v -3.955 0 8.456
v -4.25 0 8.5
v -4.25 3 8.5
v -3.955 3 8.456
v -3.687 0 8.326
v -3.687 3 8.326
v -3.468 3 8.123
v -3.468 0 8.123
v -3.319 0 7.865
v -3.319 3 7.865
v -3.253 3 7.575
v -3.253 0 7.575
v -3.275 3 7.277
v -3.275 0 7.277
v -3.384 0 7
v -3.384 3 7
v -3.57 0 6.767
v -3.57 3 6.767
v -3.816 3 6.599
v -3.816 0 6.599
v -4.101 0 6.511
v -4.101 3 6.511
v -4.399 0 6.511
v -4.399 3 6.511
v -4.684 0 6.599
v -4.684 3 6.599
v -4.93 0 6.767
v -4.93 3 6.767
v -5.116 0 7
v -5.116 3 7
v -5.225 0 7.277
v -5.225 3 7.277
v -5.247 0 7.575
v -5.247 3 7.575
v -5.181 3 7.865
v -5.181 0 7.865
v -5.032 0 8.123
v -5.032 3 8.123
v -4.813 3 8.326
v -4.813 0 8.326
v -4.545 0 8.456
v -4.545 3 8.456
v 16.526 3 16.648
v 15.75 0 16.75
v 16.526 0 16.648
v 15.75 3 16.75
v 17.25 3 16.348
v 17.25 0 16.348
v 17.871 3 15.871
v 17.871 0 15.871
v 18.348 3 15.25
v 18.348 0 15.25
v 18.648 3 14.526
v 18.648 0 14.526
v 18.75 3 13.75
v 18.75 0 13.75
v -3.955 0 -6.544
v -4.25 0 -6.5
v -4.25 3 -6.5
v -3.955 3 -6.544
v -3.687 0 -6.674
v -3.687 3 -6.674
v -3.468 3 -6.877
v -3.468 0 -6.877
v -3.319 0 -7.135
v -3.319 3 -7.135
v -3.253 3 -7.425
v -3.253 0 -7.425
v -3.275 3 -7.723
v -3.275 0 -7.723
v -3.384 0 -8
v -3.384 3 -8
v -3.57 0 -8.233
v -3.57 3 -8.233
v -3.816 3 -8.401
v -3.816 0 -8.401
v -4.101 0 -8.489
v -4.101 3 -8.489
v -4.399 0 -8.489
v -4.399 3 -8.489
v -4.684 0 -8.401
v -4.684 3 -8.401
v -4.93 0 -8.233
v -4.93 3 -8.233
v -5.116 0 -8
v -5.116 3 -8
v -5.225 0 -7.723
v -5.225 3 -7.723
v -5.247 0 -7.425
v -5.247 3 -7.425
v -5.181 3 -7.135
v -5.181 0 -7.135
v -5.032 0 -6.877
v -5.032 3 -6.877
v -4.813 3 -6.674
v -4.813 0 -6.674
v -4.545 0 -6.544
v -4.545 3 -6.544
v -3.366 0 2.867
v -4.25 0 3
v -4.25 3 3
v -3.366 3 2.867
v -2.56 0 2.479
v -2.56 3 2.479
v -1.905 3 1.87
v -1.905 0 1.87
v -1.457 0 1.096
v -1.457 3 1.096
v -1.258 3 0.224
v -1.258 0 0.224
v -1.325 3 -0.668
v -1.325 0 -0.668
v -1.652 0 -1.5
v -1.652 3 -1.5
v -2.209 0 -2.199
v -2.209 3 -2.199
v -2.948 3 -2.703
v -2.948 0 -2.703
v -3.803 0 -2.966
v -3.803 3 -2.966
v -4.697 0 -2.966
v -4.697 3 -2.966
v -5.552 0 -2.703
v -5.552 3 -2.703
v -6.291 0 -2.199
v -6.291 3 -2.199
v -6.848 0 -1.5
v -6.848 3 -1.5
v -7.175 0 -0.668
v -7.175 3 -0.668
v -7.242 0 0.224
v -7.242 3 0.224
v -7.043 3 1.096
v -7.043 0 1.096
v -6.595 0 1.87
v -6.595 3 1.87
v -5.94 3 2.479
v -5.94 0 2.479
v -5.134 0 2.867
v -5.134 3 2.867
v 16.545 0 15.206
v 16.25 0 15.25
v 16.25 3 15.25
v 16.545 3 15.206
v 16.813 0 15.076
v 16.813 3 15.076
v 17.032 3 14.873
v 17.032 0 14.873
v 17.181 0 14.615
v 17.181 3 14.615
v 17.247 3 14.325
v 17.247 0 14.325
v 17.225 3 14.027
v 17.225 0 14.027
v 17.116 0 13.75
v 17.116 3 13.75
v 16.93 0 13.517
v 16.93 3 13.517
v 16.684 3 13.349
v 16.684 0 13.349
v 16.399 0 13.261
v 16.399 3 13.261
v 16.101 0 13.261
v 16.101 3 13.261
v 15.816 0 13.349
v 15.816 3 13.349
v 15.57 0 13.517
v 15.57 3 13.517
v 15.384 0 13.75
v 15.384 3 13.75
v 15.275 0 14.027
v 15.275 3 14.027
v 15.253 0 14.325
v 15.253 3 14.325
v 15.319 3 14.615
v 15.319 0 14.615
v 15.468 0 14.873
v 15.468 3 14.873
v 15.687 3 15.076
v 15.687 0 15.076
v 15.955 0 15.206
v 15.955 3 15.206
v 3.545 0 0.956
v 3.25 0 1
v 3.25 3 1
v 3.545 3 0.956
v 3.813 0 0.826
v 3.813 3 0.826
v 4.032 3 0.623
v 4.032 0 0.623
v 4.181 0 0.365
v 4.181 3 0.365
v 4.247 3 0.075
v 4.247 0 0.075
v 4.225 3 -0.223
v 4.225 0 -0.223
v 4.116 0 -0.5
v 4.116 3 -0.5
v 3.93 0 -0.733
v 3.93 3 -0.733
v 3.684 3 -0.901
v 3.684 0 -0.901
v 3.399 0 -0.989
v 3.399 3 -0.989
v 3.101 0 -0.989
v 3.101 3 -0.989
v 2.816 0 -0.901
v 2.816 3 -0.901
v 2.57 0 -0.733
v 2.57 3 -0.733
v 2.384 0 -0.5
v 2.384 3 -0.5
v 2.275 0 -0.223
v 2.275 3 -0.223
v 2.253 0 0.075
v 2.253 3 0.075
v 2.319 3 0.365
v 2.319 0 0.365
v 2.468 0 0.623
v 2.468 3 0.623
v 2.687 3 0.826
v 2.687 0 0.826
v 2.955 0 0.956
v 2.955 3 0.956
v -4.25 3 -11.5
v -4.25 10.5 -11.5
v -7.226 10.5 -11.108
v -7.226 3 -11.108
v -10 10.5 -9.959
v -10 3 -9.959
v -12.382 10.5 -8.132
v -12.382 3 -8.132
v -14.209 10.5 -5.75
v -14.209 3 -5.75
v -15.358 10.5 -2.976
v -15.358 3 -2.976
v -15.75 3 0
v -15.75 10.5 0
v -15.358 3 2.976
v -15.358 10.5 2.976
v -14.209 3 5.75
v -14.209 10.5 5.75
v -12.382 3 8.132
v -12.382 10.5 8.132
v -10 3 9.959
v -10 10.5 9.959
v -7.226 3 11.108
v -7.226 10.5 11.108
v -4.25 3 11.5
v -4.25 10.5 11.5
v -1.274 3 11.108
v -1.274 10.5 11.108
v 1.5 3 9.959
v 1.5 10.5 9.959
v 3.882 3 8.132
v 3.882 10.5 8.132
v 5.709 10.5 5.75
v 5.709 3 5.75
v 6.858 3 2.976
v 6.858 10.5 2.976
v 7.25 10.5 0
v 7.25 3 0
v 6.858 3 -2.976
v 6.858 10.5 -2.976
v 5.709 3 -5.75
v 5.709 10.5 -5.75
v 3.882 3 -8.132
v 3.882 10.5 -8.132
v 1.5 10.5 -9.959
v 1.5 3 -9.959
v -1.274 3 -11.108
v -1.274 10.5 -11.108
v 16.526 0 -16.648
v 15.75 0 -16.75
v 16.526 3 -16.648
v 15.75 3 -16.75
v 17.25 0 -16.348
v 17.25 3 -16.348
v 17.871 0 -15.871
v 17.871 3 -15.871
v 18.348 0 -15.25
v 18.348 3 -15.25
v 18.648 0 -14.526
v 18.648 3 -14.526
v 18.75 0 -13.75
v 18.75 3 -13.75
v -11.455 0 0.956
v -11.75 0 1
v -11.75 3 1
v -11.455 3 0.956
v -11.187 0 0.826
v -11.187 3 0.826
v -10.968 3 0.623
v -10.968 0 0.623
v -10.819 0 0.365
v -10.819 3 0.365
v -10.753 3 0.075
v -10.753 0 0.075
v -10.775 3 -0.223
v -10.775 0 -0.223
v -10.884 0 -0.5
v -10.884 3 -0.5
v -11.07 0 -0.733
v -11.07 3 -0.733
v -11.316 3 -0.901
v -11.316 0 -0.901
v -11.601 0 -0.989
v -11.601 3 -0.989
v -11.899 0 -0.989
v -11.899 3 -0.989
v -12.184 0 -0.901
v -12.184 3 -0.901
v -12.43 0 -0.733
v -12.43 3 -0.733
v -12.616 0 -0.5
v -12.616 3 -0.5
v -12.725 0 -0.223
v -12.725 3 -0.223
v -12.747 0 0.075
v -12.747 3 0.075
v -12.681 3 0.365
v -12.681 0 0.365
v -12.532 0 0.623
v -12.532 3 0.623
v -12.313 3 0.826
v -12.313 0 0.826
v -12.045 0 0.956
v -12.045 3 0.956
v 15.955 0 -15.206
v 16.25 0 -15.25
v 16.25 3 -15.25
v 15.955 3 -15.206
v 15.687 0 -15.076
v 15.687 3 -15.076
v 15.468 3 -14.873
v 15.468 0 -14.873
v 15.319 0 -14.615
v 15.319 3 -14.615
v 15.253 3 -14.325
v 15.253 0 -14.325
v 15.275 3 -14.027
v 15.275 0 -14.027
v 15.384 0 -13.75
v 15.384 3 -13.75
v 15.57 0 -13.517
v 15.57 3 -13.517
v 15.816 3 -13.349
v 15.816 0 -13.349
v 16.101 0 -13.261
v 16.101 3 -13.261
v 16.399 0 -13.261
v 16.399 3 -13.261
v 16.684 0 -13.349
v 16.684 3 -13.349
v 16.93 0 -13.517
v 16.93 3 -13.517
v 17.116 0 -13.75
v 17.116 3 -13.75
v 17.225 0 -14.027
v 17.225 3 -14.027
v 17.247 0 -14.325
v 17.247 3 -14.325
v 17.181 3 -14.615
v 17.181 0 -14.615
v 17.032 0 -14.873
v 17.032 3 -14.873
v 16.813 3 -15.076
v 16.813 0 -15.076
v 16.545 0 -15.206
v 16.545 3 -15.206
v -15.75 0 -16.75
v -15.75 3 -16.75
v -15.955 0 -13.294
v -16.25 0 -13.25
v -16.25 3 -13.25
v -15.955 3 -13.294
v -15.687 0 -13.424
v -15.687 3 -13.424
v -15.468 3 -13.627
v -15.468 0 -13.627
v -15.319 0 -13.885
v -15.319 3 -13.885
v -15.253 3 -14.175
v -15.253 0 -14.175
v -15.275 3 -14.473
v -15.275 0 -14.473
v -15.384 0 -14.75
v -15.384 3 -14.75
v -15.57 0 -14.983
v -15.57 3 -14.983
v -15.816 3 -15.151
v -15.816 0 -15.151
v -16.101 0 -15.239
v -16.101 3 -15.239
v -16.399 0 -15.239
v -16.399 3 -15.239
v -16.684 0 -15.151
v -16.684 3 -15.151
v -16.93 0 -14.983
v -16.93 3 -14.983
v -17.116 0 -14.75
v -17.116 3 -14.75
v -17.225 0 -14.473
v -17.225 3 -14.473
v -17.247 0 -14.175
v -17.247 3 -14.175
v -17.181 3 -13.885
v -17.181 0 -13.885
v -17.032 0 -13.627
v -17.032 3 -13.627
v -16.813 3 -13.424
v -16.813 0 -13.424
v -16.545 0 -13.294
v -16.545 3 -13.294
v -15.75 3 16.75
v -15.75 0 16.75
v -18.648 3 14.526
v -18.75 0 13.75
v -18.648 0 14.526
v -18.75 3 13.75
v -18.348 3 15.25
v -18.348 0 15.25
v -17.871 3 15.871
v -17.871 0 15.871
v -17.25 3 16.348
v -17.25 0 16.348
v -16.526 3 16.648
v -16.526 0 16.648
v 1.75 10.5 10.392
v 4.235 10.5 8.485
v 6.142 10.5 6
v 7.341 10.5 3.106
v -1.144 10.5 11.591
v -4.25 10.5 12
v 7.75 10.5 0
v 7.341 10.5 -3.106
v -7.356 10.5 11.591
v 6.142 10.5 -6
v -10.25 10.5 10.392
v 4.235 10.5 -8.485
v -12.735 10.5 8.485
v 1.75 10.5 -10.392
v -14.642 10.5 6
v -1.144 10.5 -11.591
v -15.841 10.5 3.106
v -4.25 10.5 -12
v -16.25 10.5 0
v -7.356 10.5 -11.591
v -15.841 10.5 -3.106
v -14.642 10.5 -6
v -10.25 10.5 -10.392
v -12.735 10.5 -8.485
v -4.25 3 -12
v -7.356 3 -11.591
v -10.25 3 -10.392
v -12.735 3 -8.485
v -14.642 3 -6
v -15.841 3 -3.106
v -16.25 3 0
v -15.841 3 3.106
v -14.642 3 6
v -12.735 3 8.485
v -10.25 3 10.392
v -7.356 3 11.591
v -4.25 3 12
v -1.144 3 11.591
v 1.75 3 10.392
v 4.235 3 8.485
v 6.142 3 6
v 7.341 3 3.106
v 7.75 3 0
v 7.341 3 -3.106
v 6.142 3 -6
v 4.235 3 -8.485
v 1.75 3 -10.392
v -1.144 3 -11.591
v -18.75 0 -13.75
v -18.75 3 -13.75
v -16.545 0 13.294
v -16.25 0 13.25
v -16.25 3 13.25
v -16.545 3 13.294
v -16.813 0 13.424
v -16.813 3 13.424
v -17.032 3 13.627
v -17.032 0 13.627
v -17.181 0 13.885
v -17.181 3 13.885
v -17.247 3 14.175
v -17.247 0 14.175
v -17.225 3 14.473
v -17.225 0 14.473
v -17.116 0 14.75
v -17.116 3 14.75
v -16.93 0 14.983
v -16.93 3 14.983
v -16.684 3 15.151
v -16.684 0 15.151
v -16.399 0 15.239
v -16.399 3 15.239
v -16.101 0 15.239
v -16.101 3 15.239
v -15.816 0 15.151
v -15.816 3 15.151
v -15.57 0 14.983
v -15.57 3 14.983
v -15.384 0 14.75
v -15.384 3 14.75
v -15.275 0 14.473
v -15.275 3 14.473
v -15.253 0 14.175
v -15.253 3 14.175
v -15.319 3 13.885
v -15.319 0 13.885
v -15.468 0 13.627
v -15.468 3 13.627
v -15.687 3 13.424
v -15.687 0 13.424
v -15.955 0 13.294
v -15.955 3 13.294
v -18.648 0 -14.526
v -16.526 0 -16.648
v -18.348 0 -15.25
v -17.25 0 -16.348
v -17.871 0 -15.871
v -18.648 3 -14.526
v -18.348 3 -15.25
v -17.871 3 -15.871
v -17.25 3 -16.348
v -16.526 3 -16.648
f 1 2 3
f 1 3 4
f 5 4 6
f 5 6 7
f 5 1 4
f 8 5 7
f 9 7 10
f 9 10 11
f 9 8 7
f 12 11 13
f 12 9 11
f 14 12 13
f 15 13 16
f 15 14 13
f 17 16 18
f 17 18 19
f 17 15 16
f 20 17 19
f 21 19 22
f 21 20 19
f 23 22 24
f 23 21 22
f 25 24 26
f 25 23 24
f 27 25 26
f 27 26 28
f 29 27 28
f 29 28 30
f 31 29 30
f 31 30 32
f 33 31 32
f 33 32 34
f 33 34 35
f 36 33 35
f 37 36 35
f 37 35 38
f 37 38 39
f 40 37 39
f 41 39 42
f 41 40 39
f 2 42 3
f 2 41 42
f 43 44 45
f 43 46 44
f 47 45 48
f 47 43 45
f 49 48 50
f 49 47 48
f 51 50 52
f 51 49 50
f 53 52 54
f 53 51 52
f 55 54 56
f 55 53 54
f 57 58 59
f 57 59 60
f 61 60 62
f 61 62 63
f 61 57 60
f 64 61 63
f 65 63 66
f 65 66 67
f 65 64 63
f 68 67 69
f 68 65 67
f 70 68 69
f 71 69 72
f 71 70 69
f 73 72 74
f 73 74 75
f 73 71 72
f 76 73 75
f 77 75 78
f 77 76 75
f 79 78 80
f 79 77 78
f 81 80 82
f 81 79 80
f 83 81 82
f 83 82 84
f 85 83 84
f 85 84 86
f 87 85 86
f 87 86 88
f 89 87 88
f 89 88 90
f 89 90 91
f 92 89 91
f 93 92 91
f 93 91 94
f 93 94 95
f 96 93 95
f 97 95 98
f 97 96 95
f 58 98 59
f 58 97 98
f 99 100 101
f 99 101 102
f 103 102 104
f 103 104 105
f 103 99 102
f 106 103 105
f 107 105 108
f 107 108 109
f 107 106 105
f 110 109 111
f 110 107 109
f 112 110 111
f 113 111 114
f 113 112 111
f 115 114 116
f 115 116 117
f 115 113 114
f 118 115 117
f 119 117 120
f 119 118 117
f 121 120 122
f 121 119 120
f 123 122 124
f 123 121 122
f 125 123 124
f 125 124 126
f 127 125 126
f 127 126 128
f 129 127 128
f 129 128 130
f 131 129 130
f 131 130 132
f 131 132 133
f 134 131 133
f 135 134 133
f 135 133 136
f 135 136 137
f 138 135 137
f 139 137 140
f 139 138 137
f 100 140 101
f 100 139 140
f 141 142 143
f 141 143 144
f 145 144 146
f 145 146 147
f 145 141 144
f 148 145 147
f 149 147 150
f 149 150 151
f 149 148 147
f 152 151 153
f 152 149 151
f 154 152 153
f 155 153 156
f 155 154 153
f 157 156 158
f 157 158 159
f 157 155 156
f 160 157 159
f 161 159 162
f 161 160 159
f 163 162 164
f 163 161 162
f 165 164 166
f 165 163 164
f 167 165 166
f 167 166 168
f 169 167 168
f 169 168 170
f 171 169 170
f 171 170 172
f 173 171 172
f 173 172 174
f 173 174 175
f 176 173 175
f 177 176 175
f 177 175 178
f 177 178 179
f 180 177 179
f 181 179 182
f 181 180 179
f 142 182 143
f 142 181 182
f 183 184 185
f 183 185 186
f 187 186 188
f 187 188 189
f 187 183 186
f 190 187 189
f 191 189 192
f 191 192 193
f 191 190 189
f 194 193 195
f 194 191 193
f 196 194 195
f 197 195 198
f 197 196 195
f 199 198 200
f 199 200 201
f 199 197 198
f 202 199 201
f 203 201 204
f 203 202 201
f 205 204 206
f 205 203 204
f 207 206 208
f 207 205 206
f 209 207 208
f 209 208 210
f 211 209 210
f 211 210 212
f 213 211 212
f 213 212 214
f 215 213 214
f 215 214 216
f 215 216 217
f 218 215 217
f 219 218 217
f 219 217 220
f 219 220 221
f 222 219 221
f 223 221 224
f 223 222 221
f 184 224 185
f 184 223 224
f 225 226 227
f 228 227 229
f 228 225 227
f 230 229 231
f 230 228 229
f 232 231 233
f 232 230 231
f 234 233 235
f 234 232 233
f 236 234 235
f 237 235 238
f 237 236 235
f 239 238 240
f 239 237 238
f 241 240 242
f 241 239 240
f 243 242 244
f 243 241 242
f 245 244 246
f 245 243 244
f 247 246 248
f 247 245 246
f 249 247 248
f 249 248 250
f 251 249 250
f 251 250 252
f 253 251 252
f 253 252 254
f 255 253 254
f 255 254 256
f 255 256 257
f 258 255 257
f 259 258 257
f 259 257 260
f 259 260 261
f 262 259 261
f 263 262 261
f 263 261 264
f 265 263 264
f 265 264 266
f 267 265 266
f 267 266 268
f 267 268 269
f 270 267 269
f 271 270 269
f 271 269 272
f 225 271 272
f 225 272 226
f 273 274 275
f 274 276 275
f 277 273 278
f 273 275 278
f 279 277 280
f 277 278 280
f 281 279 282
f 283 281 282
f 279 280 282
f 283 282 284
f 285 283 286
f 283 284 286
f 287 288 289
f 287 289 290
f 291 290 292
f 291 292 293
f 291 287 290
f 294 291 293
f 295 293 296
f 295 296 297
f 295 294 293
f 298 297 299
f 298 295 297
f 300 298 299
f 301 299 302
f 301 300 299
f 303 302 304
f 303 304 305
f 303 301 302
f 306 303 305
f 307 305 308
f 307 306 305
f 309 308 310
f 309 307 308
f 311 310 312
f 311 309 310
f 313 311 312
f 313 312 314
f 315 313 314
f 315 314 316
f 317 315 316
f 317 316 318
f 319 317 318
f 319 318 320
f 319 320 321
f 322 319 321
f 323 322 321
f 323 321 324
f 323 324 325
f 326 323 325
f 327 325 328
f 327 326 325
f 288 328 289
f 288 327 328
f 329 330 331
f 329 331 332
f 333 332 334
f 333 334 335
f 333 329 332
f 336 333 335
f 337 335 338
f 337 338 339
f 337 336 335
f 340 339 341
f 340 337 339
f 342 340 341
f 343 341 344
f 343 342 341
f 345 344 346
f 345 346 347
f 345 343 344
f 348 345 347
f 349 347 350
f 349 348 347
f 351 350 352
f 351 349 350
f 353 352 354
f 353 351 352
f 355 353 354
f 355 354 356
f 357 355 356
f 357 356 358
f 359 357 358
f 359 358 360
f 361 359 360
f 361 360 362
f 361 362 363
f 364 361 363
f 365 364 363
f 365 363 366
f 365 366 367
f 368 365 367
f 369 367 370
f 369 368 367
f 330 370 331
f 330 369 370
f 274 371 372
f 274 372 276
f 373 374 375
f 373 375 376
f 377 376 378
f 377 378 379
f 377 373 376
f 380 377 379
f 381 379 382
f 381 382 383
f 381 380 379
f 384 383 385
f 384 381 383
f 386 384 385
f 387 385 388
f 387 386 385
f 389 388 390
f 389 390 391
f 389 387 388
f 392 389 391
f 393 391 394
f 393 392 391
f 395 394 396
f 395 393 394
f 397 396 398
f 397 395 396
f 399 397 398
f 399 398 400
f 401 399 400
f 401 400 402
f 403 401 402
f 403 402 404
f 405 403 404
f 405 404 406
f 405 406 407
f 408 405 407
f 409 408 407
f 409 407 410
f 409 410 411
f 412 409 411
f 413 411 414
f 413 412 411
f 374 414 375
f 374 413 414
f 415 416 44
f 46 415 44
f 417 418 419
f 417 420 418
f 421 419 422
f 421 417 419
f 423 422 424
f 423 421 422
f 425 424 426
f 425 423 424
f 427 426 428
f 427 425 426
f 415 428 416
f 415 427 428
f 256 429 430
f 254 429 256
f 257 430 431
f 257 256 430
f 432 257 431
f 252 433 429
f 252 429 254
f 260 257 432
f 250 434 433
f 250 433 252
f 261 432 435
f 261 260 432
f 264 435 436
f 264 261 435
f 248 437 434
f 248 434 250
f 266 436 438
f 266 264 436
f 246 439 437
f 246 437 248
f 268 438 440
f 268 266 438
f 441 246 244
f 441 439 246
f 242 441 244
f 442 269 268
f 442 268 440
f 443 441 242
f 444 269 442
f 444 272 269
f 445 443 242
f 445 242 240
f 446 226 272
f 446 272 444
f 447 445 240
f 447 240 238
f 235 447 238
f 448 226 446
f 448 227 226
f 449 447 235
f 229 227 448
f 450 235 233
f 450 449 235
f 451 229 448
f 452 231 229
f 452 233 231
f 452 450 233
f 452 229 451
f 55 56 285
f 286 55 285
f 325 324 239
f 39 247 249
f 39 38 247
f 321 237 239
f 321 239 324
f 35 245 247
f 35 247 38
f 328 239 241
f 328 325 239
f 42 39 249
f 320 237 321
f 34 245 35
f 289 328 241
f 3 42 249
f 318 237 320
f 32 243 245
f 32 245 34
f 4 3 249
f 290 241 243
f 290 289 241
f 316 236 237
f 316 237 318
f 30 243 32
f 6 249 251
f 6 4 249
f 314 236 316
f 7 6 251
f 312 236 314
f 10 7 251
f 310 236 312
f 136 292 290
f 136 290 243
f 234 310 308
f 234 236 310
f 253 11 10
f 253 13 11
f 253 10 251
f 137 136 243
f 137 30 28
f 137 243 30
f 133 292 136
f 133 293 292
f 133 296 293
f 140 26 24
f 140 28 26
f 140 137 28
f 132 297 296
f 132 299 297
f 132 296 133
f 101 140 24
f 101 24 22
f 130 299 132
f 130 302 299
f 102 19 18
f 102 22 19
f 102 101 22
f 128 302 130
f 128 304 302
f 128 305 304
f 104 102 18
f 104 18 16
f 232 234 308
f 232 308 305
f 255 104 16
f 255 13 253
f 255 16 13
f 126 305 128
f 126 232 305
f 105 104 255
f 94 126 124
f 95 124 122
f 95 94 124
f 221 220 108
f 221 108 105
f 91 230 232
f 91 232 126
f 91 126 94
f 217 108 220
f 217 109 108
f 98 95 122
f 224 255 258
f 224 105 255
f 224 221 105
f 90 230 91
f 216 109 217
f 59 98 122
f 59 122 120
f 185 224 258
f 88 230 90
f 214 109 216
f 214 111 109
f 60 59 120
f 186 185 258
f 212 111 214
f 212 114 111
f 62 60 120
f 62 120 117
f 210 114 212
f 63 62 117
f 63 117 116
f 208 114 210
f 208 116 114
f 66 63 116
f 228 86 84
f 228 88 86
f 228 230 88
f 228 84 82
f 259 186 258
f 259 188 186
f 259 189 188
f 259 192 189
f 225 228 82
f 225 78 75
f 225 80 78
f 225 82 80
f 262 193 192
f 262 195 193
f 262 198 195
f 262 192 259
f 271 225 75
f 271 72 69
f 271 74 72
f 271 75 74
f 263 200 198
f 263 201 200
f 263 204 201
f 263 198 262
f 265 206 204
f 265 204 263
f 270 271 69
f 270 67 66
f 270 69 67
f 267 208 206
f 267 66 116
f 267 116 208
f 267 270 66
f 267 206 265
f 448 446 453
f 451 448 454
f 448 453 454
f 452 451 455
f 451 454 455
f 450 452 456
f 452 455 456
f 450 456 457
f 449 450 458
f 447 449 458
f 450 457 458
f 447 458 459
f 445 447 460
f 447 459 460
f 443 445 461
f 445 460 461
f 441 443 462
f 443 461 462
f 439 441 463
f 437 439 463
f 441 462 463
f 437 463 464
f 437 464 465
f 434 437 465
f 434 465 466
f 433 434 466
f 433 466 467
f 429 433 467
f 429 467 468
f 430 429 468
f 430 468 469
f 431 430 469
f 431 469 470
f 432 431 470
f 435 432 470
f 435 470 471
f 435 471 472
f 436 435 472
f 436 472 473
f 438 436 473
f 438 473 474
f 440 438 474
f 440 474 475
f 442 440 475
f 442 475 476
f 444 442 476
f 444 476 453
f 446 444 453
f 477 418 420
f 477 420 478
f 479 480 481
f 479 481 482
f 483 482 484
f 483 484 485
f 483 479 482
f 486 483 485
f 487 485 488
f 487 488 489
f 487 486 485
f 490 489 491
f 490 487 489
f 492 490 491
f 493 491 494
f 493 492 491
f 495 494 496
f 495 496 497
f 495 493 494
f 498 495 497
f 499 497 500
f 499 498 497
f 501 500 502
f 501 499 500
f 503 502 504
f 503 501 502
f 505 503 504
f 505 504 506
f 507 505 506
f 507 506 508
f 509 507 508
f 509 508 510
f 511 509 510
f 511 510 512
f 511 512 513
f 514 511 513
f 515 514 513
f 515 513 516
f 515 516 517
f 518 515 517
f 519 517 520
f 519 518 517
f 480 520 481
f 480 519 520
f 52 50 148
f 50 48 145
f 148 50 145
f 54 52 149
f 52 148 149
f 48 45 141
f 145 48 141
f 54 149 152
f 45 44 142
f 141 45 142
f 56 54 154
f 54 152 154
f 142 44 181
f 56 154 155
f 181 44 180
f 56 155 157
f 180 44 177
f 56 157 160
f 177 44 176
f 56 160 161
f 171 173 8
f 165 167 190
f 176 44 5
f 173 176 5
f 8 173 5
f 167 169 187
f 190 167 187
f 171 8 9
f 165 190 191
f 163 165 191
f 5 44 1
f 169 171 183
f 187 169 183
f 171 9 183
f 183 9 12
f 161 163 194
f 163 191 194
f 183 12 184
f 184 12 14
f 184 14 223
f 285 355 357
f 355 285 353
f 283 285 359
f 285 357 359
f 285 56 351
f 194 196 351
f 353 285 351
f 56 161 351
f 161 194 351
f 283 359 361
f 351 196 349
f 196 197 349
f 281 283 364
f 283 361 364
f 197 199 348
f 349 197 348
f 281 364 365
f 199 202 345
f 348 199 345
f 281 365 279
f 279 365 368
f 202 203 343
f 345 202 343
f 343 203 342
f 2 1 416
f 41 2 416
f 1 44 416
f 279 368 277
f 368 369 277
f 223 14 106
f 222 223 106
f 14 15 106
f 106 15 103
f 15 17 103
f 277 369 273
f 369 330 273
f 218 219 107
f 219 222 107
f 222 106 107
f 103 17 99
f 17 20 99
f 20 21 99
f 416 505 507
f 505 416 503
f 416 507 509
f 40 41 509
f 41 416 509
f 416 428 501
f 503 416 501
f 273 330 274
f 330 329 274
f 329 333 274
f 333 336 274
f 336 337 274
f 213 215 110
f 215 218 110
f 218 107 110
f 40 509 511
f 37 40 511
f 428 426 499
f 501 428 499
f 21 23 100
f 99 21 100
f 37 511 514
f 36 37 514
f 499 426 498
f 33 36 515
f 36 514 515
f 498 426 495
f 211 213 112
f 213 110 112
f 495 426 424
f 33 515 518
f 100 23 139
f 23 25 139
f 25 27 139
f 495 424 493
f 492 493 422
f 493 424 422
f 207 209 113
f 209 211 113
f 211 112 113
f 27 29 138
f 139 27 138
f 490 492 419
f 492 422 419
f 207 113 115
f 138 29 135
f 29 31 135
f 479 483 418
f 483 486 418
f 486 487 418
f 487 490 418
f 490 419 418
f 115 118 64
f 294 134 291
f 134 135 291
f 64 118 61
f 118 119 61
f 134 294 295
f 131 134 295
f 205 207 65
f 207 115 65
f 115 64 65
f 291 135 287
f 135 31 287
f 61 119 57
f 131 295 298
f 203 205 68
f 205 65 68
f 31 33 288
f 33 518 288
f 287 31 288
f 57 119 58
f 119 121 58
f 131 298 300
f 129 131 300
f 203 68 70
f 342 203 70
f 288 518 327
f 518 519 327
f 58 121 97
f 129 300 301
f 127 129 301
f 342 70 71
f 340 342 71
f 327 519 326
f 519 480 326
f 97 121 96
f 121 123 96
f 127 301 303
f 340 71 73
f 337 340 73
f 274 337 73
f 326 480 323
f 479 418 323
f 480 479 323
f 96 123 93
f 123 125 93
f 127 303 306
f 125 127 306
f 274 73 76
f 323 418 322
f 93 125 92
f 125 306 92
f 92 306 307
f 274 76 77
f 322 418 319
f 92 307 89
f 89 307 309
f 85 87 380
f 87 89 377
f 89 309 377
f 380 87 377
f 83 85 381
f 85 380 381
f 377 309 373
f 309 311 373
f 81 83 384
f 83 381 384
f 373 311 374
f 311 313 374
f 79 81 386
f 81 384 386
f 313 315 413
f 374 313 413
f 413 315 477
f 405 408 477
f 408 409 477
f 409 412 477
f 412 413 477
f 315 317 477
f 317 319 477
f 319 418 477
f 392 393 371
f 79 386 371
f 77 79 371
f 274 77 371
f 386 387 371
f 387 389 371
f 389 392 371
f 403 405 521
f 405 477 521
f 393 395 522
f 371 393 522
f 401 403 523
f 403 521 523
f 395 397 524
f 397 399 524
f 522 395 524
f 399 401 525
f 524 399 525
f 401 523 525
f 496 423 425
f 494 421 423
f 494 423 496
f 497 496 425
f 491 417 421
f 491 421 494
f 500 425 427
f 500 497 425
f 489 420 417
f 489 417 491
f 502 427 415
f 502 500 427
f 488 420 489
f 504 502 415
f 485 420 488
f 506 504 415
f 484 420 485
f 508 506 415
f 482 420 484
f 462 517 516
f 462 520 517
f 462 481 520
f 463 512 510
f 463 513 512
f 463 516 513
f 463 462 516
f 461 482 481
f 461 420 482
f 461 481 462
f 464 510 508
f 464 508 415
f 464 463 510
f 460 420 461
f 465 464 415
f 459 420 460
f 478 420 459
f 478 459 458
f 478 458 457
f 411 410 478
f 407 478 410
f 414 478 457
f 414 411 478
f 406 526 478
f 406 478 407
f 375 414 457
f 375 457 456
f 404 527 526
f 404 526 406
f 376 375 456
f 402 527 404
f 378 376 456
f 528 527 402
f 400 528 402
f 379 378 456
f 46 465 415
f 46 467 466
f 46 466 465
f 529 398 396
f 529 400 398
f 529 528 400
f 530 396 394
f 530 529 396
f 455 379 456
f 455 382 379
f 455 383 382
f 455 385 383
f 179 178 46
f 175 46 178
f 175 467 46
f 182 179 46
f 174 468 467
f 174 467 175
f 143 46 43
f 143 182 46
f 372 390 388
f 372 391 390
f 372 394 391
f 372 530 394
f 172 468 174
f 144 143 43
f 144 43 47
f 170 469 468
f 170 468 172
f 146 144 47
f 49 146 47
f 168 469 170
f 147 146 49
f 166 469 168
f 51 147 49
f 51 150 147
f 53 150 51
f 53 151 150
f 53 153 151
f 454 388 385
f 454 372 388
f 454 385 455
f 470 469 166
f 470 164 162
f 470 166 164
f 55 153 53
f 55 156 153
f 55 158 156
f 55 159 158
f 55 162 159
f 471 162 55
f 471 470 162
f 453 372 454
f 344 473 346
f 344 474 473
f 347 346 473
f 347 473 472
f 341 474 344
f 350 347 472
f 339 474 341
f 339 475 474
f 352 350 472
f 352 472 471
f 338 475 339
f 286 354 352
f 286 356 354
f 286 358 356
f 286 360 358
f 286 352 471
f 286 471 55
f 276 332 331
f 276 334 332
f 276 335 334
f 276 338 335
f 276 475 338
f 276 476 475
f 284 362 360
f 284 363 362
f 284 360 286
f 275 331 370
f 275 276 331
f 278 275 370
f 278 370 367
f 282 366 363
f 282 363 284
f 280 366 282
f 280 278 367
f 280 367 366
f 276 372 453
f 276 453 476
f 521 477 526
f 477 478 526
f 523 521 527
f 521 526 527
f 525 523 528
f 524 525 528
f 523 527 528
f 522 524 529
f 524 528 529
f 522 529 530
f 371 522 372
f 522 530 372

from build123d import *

# Parameters (mm, degrees)
SKETCH_1_W      = 37.5
SKETCH_1_H      = 33.5
SKETCH_1_R      = 3
SKETCH_1_R_2    = 1
EXTRUDE_1_DEPTH = 3
SKETCH_1_3_R    = 12
SKETCH_1_3_R_2  = 11.5
EXTRUDE_2_DEPTH = 10.5
FILLET_1_R      = 3


with BuildPart() as part:
    # 草图1 → 凸台-拉伸1 (new body)
    with BuildSketch(Plane(origin=(0, 0, 0), x_dir=(1, 0, 0), z_dir=(0, 1, 0))):
        Rectangle(SKETCH_1_W, SKETCH_1_H)
        with Locations((-4.25, 0)):
            Circle(SKETCH_1_R, mode=Mode.SUBTRACT)
        with Locations((-11.75, 0)):
            Circle(SKETCH_1_R_2, mode=Mode.SUBTRACT)
        with Locations((-4.25, 7.5)):
            Circle(SKETCH_1_R_2, mode=Mode.SUBTRACT)
        with Locations((3.25, 0)):
            Circle(SKETCH_1_R_2, mode=Mode.SUBTRACT)
        with Locations((-4.25, -7.5)):
            Circle(SKETCH_1_R_2, mode=Mode.SUBTRACT)
        with Locations((-16.25, 14.25)):
            Circle(SKETCH_1_R_2, mode=Mode.SUBTRACT)
        with Locations((-16.25, -14.25)):
            Circle(SKETCH_1_R_2, mode=Mode.SUBTRACT)
        with Locations((16.25, 14.25)):
            Circle(SKETCH_1_R_2, mode=Mode.SUBTRACT)
        with Locations((16.25, -14.25)):
            Circle(SKETCH_1_R_2, mode=Mode.SUBTRACT)
    extrude(amount=EXTRUDE_1_DEPTH)

    # 草图1<3> → 凸台-拉伸2 (add)
    with BuildSketch(Plane(origin=(0, 0, 0), x_dir=(1, 0, 0), z_dir=(0, 1, 0))):
        with Locations((-4.25, 0)):
            Circle(SKETCH_1_3_R)
        with Locations((-4.25, 0)):
            Circle(SKETCH_1_3_R_2, mode=Mode.SUBTRACT)
    extrude(amount=EXTRUDE_2_DEPTH)

    # 圆角1
    fillet_1_edges = [part.edges().sort_by_distance(p)[0] for p in [
        (-18.75, 1.5, 16.75),
        (18.75, 1.5, 16.75),
        (18.75, 1.5, -16.75),
        (-18.75, 1.5, -16.75),
    ]]
    fillet(fillet_1_edges, radius=FILLET_1_R)


solid = part.part
